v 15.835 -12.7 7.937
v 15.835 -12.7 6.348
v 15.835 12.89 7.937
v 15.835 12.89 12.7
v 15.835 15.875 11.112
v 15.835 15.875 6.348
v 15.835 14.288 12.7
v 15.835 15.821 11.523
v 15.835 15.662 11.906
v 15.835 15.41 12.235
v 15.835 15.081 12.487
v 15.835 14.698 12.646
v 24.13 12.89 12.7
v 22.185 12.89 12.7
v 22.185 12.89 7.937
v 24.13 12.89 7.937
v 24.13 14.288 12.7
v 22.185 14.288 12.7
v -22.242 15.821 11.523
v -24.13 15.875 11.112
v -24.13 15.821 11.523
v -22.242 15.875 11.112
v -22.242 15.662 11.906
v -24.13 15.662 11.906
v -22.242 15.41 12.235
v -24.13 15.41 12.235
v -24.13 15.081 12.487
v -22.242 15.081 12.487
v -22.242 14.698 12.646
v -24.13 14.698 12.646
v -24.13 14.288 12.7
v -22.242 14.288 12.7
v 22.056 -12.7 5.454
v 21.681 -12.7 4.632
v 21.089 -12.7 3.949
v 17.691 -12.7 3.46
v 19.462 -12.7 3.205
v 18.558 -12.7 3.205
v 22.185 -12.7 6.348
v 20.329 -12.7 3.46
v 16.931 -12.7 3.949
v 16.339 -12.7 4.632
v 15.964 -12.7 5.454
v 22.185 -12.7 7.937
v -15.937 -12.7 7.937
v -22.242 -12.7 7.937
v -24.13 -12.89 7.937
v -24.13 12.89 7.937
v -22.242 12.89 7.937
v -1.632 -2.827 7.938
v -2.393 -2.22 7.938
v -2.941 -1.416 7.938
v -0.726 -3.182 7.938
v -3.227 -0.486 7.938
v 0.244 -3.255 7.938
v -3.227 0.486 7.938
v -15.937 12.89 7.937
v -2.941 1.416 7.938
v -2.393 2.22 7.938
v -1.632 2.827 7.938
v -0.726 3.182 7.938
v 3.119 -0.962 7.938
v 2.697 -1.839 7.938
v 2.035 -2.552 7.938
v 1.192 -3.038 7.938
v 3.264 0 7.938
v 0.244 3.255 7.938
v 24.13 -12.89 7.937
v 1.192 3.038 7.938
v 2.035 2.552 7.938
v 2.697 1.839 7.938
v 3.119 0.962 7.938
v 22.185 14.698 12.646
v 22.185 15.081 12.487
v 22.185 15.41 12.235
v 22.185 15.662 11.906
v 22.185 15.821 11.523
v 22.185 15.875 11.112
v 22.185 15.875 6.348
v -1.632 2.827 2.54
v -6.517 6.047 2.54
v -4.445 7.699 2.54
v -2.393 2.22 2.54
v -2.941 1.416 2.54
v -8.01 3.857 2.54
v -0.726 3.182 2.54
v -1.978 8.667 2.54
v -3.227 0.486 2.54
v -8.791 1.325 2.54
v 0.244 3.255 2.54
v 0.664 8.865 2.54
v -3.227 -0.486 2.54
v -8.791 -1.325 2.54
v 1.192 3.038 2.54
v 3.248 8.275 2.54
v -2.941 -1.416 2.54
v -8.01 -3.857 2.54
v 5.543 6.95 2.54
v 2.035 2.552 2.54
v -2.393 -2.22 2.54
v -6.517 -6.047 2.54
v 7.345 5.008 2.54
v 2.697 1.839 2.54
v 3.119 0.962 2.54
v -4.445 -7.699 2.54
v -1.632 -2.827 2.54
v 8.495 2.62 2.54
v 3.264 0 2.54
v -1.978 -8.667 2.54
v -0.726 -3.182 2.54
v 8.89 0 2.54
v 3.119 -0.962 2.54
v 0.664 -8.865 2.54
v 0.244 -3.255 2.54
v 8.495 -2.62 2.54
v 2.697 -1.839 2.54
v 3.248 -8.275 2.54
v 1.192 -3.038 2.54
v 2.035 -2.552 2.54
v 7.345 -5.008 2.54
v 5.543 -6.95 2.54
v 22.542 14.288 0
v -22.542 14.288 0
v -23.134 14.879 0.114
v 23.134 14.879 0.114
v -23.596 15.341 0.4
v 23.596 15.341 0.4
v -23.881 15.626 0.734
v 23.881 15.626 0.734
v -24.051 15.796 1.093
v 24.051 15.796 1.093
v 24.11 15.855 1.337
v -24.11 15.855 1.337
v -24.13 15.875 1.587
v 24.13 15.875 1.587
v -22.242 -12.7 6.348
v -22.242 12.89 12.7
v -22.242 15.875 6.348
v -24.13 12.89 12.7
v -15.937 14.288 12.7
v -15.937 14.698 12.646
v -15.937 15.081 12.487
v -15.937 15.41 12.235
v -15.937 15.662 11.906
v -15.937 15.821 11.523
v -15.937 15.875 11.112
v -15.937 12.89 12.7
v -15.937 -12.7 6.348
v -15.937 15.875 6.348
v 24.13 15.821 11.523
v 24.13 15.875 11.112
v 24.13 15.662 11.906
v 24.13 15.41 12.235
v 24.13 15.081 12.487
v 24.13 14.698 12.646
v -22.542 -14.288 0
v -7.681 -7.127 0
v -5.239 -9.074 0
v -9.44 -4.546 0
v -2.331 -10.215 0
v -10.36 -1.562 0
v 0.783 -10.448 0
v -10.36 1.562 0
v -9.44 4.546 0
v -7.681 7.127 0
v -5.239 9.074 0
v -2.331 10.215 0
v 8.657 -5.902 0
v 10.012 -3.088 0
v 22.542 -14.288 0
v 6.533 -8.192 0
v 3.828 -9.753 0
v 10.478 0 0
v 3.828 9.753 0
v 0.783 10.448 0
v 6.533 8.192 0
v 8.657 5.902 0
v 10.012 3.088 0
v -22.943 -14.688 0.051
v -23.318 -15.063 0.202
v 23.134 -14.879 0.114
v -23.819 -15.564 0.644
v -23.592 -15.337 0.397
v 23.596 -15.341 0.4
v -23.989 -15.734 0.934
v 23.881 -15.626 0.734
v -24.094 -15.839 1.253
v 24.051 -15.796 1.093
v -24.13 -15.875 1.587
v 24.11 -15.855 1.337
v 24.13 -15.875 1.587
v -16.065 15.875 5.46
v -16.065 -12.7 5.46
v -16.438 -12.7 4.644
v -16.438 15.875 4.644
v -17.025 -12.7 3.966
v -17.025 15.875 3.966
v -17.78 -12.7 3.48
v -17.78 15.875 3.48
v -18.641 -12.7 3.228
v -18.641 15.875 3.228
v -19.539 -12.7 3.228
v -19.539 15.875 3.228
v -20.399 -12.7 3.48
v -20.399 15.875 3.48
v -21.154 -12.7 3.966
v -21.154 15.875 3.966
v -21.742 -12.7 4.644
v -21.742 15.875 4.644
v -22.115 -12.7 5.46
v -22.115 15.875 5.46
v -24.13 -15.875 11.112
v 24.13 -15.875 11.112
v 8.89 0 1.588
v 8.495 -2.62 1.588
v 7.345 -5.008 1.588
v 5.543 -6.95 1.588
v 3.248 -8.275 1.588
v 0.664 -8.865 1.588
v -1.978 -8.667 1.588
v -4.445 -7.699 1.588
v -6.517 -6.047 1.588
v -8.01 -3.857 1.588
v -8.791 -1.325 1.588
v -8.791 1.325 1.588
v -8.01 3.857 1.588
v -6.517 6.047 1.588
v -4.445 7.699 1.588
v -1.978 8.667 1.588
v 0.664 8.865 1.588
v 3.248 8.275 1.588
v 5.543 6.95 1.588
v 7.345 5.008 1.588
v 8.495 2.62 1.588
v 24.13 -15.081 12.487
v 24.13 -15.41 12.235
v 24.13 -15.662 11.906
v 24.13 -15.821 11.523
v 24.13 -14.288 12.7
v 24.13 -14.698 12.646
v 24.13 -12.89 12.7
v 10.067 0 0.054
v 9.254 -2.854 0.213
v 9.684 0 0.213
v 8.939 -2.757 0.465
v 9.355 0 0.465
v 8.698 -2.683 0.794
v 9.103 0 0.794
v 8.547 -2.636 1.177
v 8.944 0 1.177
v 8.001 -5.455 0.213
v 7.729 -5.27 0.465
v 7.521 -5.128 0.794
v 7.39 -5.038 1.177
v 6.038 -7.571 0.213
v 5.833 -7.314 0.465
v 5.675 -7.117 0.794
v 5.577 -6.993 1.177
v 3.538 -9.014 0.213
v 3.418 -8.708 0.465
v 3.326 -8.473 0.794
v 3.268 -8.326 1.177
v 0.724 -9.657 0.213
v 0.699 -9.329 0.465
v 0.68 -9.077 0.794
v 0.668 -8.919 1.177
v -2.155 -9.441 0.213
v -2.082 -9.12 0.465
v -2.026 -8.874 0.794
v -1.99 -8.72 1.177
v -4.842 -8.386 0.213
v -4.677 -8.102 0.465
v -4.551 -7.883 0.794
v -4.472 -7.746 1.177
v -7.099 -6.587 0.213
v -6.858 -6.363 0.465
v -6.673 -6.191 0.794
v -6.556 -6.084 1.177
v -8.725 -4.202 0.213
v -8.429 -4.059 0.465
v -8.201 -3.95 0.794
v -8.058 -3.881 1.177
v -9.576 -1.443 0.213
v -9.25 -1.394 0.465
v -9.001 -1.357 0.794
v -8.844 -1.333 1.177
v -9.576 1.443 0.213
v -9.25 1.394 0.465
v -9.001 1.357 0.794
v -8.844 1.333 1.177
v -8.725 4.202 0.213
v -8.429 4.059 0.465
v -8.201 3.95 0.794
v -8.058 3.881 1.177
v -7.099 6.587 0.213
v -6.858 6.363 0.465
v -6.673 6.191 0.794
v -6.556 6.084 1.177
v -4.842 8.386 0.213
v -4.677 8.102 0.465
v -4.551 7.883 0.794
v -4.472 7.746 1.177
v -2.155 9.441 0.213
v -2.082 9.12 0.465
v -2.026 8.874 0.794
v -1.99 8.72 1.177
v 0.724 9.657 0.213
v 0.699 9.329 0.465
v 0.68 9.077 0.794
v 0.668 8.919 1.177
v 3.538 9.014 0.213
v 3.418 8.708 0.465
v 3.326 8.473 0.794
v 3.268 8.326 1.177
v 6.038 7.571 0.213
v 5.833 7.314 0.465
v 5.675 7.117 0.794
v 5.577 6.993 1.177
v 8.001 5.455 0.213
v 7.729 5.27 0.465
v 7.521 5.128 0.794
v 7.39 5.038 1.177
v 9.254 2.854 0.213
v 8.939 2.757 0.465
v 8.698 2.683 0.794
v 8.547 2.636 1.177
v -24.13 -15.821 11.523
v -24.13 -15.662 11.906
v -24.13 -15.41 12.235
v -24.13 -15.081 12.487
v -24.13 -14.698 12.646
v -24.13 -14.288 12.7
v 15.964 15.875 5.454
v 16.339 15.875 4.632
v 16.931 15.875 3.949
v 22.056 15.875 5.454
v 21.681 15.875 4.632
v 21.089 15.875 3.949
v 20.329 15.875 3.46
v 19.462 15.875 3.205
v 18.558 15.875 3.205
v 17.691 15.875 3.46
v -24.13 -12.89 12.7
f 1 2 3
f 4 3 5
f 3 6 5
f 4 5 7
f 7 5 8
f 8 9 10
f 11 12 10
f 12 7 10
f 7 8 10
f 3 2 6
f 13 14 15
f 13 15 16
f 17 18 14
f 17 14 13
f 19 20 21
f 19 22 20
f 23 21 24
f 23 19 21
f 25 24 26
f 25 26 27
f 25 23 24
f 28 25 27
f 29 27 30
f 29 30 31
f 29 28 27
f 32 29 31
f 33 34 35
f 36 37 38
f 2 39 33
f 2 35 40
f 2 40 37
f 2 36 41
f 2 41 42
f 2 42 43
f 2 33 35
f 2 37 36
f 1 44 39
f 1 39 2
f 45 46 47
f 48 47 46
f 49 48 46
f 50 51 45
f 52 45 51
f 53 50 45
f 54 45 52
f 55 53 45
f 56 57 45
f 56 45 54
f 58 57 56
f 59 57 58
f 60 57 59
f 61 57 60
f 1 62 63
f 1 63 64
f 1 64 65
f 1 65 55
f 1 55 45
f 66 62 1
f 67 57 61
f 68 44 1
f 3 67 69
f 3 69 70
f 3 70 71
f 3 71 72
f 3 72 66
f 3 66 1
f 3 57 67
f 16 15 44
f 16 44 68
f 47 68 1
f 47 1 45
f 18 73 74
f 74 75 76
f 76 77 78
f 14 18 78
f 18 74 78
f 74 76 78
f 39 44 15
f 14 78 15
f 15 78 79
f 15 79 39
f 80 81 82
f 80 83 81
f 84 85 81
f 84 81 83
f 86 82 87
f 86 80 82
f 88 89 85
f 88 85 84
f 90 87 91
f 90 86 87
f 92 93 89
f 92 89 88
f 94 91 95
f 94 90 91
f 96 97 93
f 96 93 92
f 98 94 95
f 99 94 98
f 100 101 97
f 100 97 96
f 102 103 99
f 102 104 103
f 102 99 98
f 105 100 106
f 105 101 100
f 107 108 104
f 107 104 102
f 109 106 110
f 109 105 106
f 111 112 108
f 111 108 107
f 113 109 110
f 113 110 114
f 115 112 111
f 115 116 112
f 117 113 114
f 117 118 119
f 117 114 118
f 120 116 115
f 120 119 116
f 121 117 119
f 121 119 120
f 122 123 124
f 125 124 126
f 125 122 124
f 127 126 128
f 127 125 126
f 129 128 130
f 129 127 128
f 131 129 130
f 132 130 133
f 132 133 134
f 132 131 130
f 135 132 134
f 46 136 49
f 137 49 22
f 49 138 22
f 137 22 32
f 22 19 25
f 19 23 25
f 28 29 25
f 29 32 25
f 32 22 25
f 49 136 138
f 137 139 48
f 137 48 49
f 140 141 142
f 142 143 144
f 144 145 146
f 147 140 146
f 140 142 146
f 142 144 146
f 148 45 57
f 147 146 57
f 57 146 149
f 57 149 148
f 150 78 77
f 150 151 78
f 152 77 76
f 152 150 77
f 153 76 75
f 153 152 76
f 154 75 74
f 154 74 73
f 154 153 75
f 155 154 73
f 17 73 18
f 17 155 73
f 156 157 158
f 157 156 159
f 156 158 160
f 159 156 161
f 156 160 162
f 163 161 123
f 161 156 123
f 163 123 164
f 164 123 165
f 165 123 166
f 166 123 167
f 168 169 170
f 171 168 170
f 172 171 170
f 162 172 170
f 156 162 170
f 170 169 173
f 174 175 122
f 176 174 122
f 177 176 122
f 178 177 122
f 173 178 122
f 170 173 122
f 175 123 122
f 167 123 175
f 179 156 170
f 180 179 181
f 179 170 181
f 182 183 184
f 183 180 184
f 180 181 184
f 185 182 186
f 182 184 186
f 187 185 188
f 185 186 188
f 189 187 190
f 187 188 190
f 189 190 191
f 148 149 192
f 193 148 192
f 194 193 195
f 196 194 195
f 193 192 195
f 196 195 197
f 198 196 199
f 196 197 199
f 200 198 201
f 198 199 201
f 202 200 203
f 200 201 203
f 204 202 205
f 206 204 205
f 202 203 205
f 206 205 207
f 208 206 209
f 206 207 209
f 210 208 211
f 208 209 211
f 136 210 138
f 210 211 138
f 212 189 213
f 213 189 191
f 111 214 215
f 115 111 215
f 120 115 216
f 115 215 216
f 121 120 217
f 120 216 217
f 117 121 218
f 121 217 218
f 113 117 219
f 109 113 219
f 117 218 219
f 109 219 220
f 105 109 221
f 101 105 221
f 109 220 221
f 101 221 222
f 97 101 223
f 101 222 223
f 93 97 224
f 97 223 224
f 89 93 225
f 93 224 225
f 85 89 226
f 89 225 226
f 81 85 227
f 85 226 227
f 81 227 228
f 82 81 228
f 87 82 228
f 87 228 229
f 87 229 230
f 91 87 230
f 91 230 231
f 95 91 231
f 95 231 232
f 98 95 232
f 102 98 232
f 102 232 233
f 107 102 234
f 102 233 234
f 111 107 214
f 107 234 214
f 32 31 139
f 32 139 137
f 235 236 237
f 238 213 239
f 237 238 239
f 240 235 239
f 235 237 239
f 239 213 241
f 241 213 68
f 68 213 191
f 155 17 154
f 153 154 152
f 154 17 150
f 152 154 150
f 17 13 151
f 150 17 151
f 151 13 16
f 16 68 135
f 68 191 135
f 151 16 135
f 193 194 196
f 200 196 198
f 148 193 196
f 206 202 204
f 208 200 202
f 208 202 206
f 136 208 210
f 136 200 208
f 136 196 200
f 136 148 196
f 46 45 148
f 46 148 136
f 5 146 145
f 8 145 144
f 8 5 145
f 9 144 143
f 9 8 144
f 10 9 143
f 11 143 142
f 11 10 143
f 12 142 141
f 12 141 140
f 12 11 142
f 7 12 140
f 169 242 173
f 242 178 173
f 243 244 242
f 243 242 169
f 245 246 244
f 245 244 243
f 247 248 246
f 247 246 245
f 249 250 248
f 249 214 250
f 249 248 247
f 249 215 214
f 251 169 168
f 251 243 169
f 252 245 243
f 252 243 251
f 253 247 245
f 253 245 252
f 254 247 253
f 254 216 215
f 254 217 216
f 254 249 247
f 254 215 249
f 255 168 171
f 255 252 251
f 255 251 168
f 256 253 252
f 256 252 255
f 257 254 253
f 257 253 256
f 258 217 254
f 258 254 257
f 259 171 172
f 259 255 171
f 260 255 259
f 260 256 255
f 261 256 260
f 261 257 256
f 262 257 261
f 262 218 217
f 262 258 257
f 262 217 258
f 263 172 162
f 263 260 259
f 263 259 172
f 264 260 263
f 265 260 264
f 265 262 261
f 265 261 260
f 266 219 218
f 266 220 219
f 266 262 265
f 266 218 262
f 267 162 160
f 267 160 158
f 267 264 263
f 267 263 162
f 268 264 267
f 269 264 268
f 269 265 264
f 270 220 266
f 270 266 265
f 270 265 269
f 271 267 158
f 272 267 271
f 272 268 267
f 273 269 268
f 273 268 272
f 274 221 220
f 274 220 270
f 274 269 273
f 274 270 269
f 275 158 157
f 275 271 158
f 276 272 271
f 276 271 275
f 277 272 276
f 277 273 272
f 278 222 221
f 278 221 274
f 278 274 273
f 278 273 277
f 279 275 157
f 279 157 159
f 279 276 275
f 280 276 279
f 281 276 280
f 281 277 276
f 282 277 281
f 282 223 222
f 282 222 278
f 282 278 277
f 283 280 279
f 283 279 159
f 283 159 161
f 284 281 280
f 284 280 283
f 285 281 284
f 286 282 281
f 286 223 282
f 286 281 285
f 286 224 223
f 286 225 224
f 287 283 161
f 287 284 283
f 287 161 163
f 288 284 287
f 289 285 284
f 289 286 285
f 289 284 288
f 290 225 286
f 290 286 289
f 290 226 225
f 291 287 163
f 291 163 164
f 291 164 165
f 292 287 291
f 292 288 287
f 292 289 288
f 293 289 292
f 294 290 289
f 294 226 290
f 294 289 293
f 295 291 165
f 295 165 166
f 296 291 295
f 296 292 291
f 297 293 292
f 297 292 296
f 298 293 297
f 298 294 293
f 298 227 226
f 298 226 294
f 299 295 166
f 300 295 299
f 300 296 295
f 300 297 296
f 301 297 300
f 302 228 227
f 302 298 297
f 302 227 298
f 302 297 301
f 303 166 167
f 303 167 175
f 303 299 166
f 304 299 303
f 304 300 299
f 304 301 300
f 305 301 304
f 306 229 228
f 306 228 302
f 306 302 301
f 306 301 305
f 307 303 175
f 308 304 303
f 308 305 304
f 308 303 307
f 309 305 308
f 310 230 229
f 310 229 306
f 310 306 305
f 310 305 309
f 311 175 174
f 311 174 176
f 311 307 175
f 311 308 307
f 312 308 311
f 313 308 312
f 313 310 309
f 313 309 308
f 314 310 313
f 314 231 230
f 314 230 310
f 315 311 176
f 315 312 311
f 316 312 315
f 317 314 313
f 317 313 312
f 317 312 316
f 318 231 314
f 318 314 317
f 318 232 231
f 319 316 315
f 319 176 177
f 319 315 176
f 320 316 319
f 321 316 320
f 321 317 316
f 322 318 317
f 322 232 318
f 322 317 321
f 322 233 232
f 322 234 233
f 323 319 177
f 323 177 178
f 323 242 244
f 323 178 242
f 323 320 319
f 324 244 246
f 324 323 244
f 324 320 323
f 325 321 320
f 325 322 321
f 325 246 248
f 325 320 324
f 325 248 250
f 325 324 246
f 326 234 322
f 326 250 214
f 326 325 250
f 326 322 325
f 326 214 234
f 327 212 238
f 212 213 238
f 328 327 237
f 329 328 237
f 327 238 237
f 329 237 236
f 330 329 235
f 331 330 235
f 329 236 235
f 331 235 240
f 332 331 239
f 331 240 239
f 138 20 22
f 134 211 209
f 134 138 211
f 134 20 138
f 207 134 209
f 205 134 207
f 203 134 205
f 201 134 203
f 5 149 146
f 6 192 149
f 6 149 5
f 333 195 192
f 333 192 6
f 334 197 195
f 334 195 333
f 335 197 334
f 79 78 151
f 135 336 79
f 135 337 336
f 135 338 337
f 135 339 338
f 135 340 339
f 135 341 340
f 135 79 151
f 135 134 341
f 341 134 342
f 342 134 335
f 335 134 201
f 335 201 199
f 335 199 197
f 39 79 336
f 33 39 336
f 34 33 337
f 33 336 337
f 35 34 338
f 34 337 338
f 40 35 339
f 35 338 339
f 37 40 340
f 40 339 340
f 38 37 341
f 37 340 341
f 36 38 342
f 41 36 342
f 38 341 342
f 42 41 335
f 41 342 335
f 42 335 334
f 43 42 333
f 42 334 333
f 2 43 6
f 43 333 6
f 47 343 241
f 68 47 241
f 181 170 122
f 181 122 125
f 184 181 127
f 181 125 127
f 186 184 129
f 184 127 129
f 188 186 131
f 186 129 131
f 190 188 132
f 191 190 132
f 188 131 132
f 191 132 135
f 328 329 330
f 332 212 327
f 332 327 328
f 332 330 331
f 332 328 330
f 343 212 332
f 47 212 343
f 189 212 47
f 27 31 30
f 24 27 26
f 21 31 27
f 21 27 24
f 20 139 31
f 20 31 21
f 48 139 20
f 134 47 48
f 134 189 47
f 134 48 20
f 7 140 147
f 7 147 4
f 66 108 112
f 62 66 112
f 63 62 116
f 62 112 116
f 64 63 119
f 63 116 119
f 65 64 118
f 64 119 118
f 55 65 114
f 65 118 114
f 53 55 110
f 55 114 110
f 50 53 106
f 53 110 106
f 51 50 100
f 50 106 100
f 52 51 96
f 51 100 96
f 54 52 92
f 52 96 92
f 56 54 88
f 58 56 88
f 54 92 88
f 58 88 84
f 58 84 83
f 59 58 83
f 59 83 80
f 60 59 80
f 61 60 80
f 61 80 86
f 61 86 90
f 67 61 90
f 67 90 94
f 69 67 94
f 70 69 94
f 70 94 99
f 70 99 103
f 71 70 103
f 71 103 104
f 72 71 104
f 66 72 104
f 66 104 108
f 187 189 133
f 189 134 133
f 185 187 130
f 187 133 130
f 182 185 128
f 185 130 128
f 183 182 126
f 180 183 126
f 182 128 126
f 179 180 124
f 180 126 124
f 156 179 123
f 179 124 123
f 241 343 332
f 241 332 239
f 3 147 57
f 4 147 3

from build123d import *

# Parameters (mm, degrees)
F0_W     = 48.26
F0_H     = 31.75
F1_DEPTH = 12.7
F2_W     = 48.26
F2_H     = 25.781
F3_DEPTH = 4.7625
F5_DEPTH = 28.575
F6_R     = 3.2639
F7_DEPTH = 7.9375
F6_R_2   = 8.89
F8_DEPTH = 2.54
F9_R     = 1.5875
F10_R    = 1.5875
F11_R    = 1.5875
F12_R    = 1.5875


with BuildPart() as f1:
    # F0 (on Top) → F1 (new body)
    with BuildSketch(Plane.XY):
        Rectangle(F0_W, F0_H)
    extrude(amount=F1_DEPTH)

    # F2 (on face) → F3 (cut)
    with BuildSketch(Plane.XY.offset(12.7)):
        Rectangle(F2_W, F2_H)
    extrude(amount=-F3_DEPTH, mode=Mode.SUBTRACT)

    # F4 (on face) → F5 (cut)
    with BuildSketch(Plane(origin=(0, 15.875, 0), x_dir=(-1, 0, 0), z_dir=(0, 1, 0))):
        with BuildLine():
            Line((-22.1851086635, 12.7), (-22.1851086635, 6.3481266276))
            ThreePointArc((-22.1851086635, 6.3481266276), (-19.0101086706, 3.1731266347), (-15.8351086777, 6.3481266276))
            Line((-15.8351086777, 6.3481266276), (-15.8351086777, 12.7))
            Line((-15.8351086777, 12.7), (-22.1851086635, 12.7))
        make_face()
        with BuildLine():
            Line((22.2424135567, 12.7), (15.9373691021, 12.7))
            Line((15.9373691021, 12.7), (15.9373691021, 6.3481266276))
            ThreePointArc((15.9373691021, 6.3481266276), (19.0898913294, 3.1956044003), (22.2424135567, 6.3481266276))
            Line((22.2424135567, 6.3481266276), (22.2424135567, 12.7))
        make_face()
    extrude(amount=-F5_DEPTH, mode=Mode.SUBTRACT)

    # F6 (on face) → F7 (cut, through all)
    with BuildSketch(Plane(origin=(0, 0, 0), x_dir=(1, 0, 0), z_dir=(0, 0, -1))):
        Circle(F6_R)
    extrude(amount=-F7_DEPTH, mode=Mode.SUBTRACT)

    # F6 (on face) → F8 (cut)
    with BuildSketch(Plane(origin=(0, 0, 0), x_dir=(1, 0, 0), z_dir=(0, 0, -1))):
        Circle(F6_R_2)
        Circle(F6_R, mode=Mode.SUBTRACT)
    extrude(amount=-F8_DEPTH, mode=Mode.SUBTRACT)

    # F9
    f9_edges = [f1.edges().sort_by_distance(p)[0] for p in [
        (24.13, 0, 0),
        (0, 15.875, 0),
        (-24.13, 0, 0),
        (0, -15.875, 0),
        (-8.89, 0, 0),
    ]]
    fillet(f9_edges, radius=F9_R)

    # F10
    f10_edges = [f1.edges().sort_by_distance(p)[0] for p in [
        (-0.05113, 15.875, 12.7),
        (0, -15.875, 12.7),
    ]]
    fillet(f10_edges, radius=F10_R)

    # F11
    f11_edges = [f1.edges().sort_by_distance(p)[0] for p in [
        (-23.186207, 15.875, 12.7),
    ]]
    fillet(f11_edges, radius=F11_R)

    # F12
    f12_edges = [f1.edges().sort_by_distance(p)[0] for p in [
        (23.157554, 15.875, 12.7),
    ]]
    fillet(f12_edges, radius=F12_R)


solid = f1.part
